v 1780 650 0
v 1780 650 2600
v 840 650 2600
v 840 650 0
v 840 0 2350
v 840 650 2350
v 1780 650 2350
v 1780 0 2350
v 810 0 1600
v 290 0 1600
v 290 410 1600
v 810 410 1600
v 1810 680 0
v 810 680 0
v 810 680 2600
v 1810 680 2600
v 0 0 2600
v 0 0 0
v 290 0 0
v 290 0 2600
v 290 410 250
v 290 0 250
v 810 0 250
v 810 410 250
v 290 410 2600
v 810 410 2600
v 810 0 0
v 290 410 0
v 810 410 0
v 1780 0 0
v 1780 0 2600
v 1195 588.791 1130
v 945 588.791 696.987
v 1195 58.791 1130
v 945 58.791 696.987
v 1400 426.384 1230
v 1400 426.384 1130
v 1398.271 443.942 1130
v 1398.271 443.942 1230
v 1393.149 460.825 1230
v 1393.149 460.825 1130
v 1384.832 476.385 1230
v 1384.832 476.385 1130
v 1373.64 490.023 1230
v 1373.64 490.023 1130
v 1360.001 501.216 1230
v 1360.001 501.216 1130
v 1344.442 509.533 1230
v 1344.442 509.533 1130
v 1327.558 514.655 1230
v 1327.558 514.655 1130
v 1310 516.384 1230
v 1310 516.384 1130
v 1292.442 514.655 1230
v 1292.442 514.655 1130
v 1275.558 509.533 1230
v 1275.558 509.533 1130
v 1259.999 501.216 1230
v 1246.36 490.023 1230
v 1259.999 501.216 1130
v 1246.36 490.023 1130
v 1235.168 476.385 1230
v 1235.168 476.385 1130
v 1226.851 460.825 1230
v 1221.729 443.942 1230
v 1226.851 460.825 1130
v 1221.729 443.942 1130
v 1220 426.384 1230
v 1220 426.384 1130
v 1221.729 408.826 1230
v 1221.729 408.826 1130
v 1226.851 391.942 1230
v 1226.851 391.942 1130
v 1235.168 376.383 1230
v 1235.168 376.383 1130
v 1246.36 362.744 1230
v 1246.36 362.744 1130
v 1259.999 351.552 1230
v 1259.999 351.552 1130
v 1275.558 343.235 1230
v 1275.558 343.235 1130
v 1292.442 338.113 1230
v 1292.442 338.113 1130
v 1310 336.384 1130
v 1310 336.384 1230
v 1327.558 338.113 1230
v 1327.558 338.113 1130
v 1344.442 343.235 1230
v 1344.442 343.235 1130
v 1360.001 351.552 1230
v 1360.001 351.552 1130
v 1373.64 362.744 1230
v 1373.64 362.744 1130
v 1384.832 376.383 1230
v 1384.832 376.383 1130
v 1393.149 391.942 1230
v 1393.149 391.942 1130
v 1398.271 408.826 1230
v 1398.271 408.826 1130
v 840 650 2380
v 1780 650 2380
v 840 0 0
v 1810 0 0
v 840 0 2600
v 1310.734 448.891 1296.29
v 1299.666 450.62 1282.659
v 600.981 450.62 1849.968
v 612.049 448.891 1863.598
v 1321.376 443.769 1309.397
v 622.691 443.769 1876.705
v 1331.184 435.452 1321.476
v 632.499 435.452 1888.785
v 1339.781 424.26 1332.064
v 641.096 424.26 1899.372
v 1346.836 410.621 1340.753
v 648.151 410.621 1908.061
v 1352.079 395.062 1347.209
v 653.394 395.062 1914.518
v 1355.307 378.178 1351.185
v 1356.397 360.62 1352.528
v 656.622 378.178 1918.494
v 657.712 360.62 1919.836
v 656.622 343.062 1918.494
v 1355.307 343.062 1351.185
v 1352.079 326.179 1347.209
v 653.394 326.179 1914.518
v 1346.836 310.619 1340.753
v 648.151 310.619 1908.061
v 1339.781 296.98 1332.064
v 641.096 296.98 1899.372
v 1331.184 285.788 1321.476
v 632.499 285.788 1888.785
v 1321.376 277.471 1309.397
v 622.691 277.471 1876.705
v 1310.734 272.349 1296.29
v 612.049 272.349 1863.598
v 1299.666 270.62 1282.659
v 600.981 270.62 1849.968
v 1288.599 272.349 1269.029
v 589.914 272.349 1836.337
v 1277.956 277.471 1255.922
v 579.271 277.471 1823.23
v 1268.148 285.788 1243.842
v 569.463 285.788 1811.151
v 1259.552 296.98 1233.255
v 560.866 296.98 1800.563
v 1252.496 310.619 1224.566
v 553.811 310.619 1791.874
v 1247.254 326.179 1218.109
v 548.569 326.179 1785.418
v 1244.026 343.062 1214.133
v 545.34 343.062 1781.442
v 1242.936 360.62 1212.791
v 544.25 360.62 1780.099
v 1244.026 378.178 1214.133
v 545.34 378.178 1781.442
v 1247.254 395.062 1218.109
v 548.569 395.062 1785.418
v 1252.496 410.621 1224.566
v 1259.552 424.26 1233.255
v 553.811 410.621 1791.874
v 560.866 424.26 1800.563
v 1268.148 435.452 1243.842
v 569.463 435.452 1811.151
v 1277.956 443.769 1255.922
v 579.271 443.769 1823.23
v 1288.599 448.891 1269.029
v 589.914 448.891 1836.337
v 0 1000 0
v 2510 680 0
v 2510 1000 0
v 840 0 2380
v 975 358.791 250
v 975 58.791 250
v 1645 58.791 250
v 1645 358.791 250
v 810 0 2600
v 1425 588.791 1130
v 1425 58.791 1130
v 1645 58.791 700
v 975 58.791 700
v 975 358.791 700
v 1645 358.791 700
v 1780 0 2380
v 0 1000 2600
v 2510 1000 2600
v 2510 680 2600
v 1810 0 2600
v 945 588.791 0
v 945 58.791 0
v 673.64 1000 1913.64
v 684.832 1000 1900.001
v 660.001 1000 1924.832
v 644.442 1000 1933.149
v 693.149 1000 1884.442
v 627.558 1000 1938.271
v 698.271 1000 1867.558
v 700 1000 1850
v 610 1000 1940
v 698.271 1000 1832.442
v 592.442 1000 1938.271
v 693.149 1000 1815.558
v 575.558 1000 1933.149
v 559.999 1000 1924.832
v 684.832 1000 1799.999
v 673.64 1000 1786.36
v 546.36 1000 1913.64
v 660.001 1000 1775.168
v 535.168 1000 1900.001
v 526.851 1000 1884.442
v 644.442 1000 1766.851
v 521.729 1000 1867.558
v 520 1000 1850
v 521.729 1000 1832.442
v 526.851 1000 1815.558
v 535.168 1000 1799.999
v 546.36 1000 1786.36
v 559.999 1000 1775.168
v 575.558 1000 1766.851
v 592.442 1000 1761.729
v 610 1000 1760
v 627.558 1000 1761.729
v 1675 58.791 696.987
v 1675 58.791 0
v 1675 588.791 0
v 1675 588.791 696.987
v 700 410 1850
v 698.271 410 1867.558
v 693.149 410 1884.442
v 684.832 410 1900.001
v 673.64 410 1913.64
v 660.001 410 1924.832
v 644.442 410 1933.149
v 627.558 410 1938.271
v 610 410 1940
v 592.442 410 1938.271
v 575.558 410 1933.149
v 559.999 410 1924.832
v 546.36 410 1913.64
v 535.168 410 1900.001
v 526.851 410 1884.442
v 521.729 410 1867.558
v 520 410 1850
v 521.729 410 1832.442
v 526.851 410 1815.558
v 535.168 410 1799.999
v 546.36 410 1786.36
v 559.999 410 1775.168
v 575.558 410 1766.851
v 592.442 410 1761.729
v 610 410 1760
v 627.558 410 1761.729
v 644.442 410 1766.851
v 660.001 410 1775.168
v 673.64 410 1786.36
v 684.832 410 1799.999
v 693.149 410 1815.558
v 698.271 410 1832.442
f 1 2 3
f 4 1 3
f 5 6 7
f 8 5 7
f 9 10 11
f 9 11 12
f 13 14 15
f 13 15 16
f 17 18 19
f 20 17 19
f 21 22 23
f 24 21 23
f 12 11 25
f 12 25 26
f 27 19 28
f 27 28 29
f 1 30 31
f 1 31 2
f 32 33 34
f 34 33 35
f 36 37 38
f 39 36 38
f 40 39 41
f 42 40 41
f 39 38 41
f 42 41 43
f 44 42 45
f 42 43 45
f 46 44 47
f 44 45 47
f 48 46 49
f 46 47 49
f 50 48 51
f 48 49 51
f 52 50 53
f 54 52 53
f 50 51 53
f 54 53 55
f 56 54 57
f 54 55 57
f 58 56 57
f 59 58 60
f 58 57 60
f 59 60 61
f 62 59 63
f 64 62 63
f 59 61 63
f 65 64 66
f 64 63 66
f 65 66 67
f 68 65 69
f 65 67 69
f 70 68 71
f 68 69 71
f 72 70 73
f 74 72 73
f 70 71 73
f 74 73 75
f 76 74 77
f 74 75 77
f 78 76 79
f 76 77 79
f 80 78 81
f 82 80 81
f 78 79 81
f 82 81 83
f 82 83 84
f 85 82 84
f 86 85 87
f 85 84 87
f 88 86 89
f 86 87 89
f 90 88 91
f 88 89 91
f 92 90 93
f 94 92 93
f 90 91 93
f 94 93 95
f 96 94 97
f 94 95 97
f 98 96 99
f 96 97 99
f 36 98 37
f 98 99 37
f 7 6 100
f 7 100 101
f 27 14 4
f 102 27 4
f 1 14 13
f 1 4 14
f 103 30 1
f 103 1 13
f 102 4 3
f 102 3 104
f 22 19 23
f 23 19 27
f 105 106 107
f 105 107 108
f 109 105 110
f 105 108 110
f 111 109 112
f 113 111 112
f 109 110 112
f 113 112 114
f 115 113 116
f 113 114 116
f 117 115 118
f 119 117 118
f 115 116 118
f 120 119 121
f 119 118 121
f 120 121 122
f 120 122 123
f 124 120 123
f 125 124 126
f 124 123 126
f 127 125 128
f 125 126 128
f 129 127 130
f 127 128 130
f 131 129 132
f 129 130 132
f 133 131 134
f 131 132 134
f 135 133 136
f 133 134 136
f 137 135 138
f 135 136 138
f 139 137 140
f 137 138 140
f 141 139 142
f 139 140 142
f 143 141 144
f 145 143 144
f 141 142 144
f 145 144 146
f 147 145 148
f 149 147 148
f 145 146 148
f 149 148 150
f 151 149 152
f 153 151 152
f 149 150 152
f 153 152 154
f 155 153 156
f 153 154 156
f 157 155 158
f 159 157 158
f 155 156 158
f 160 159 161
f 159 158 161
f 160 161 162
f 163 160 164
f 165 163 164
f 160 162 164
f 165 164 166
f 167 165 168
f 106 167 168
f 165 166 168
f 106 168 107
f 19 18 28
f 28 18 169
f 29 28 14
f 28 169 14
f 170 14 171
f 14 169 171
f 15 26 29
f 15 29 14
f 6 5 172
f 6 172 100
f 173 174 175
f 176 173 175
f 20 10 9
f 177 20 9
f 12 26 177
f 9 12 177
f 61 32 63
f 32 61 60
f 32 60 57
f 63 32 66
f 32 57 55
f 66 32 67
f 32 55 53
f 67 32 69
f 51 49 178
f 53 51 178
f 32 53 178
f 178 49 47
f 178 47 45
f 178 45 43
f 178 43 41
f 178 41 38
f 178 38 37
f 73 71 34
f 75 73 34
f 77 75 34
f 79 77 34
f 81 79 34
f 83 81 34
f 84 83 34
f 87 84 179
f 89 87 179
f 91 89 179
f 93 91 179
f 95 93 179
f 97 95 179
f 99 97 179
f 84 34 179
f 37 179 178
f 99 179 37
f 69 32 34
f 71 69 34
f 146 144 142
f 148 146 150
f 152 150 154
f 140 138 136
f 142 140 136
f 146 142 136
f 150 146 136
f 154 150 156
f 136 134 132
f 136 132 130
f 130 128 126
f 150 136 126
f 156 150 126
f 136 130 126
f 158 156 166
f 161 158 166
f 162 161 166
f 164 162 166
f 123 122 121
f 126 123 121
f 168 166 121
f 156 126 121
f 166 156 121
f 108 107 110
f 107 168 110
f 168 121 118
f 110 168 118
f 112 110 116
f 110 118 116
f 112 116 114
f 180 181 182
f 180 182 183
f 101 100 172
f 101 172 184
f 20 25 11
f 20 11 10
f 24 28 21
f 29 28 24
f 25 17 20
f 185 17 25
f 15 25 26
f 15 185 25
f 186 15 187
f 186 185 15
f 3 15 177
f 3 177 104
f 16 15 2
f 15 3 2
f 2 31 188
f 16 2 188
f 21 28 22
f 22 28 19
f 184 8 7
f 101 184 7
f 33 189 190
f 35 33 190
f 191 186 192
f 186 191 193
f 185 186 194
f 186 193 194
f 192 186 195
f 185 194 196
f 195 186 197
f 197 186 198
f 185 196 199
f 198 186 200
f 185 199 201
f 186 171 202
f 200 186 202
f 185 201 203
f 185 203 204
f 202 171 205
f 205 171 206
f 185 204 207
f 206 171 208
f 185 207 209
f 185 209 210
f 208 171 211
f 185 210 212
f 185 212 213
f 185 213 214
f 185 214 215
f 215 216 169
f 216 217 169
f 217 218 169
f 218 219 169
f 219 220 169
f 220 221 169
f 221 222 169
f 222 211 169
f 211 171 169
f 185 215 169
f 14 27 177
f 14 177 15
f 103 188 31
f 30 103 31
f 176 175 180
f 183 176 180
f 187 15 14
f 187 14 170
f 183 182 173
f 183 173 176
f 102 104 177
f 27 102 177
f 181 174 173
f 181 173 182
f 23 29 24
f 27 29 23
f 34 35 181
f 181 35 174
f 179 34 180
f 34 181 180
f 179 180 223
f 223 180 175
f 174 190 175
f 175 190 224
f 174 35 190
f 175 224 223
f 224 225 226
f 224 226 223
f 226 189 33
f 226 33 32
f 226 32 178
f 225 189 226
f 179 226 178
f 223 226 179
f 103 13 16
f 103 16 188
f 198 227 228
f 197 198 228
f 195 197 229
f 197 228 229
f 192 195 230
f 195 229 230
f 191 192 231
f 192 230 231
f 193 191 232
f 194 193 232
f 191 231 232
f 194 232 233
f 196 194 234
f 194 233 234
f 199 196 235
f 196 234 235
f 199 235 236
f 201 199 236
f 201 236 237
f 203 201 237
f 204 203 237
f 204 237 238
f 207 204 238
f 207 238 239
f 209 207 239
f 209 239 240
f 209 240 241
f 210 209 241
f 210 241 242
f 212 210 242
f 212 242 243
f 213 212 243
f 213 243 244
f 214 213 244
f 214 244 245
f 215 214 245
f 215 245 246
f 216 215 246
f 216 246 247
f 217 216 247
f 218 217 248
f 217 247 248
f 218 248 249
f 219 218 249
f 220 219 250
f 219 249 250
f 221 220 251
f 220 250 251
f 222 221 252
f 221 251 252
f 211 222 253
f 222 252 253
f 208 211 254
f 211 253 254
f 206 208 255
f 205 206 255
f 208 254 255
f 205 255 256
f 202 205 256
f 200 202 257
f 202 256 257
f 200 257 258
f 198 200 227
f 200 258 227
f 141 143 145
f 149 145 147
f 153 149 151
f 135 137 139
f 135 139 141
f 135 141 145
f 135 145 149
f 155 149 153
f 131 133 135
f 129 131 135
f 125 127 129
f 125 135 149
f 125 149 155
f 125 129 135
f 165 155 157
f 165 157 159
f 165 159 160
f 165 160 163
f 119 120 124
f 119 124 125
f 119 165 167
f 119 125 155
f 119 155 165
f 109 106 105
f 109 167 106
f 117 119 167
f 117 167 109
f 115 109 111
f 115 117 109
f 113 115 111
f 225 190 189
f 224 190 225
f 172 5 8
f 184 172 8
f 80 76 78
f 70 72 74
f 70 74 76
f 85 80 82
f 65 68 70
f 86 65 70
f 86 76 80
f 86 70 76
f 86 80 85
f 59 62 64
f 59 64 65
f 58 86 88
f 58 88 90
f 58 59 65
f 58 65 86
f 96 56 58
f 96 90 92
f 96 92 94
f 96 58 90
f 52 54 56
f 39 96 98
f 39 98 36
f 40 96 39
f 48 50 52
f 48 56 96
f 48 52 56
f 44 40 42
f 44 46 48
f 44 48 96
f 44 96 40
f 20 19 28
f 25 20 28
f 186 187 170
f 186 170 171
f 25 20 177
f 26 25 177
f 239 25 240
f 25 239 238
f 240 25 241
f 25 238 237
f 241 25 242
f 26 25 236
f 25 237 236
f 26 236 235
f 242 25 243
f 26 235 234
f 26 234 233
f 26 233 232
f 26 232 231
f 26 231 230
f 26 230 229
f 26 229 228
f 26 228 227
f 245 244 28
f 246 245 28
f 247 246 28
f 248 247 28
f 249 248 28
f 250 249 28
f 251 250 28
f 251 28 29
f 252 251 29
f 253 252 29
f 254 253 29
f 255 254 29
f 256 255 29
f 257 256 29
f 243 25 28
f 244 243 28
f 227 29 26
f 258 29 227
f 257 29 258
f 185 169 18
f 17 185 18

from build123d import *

# Parameters (mm, degrees)
F1_DEPTH  = 2600
F2_R      = 90
F3_DEPTH  = 590.001
F5_W      = 730
F5_H      = 530
F6_DEPTH  = 1130
F7_W      = 670
F7_H      = 450
F8_DEPTH  = 300
F9_SIZE2  = 433.0127018922
F9_SIZE   = 250
F10_R     = 90
F11_DEPTH = 100
F15_R     = 90
F16_DEPTH = 900
F17_W     = 520
F17_H     = 410
F18_DEPTH = 250
F19_START = -1600
F19_DEPTH = 1000
F20_DEPTH = 2600
F22_W     = 940
F22_H     = 650
F23_DEPTH = 30


with BuildPart() as f1:
    # F0 (on Top) → F1 (new body)
    with BuildSketch(Plane.XY):
        Polygon((0, 1000), (0, 0), (290, 0), (290, 410), (810, 410), (810, 680), (2510, 680), (2510, 1000), align=None)
    extrude(amount=F1_DEPTH)

    # F2 (on face) → F3 (cut, through all)
    with BuildSketch(Plane.XZ.offset(-410)):
        with Locations((610, 1850)):
            Circle(F2_R)
    extrude(amount=-F3_DEPTH, mode=Mode.SUBTRACT)


with BuildPart() as f6:
    # F5 (on face) → F6 (new body)
    with BuildSketch(Plane(origin=(0, 0, 0), x_dir=(1, 0, 0), z_dir=(0, 0, -1))):
        with Locations((1310, -323.7908844676)):
            Rectangle(F5_W, F5_H)
    extrude(amount=-F6_DEPTH)

    # F7 (on face) → F8 (cut)
    with BuildSketch(Plane.XZ.offset(-58.7908844676)):
        with Locations((1310, 475)):
            Rectangle(F7_W, F7_H)
    extrude(amount=-F8_DEPTH, mode=Mode.SUBTRACT)

    # F9
    f9_edges = [f6.edges().sort_by_distance(p)[0] for p in [
        (945, 323.790884, 1130),
        (1675, 323.790884, 1130),
    ]]
    f9_side = f6.faces().sort_by_distance((1310, 323.790884, 1130))[0]
    chamfer(f9_edges, length=F9_SIZE, length2=F9_SIZE2, reference=f9_side)

    # F10 (on face) → F11 (join)
    with BuildSketch(Plane.XY.offset(1130)):
        with Locations((1310, 426.383882761)):
            Circle(F10_R)
    extrude(amount=F11_DEPTH)


with BuildPart() as f16:
    # F15 (on line) → F16 (new body)
    with BuildSketch(Plane(origin=(-543.0818226135, 0, 440.9639212682), x_dir=(0, 1, 0), z_dir=(0.7763168849, 0, -0.6303428387))):
        with Locations((360.6200218201, 1814.9853944778)):
            Circle(F15_R)
    extrude(amount=F16_DEPTH)


with BuildPart() as f18:
    # F17 (on face) → F18 (new body)
    with BuildSketch(Plane(origin=(0, 0, 0), x_dir=(1, 0, 0), z_dir=(0, 0, -1))):
        with Locations((550, -205)):
            Rectangle(F17_W, F17_H)
    extrude(amount=-F18_DEPTH)


with BuildPart() as f19:
    # F17 (on face) → F19 (new body)
    with BuildSketch(Plane(origin=(0, 0, 0), x_dir=(1, 0, 0), z_dir=(0, 0, -1)).offset(F19_START)):
        with Locations((550, -205)):
            Rectangle(F17_W, F17_H)
    extrude(amount=-F19_DEPTH)


with BuildPart() as f20:
    # F4 (on face) → F20 (new body, through all)
    with BuildSketch(Plane(origin=(0, 0, 0), x_dir=(1, 0, 0), z_dir=(0, 0, -1))):
        Polygon((810, 0), (810, -680), (1810, -680), (1810, 0), (1780, 0), (1780, -650), (840, -650), (840, 0), align=None)
    extrude(amount=-F20_DEPTH)


with BuildPart() as f23:
    # F22 (on offset) → F23 (new body)
    with BuildSketch(Plane.XY.offset(2350)):
        with Locations((1310, 325)):
            Rectangle(F22_W, F22_H)
    extrude(amount=F23_DEPTH)


solid = Compound([f1.part, f6.part, f16.part, f18.part, f19.part, f20.part, f23.part])
